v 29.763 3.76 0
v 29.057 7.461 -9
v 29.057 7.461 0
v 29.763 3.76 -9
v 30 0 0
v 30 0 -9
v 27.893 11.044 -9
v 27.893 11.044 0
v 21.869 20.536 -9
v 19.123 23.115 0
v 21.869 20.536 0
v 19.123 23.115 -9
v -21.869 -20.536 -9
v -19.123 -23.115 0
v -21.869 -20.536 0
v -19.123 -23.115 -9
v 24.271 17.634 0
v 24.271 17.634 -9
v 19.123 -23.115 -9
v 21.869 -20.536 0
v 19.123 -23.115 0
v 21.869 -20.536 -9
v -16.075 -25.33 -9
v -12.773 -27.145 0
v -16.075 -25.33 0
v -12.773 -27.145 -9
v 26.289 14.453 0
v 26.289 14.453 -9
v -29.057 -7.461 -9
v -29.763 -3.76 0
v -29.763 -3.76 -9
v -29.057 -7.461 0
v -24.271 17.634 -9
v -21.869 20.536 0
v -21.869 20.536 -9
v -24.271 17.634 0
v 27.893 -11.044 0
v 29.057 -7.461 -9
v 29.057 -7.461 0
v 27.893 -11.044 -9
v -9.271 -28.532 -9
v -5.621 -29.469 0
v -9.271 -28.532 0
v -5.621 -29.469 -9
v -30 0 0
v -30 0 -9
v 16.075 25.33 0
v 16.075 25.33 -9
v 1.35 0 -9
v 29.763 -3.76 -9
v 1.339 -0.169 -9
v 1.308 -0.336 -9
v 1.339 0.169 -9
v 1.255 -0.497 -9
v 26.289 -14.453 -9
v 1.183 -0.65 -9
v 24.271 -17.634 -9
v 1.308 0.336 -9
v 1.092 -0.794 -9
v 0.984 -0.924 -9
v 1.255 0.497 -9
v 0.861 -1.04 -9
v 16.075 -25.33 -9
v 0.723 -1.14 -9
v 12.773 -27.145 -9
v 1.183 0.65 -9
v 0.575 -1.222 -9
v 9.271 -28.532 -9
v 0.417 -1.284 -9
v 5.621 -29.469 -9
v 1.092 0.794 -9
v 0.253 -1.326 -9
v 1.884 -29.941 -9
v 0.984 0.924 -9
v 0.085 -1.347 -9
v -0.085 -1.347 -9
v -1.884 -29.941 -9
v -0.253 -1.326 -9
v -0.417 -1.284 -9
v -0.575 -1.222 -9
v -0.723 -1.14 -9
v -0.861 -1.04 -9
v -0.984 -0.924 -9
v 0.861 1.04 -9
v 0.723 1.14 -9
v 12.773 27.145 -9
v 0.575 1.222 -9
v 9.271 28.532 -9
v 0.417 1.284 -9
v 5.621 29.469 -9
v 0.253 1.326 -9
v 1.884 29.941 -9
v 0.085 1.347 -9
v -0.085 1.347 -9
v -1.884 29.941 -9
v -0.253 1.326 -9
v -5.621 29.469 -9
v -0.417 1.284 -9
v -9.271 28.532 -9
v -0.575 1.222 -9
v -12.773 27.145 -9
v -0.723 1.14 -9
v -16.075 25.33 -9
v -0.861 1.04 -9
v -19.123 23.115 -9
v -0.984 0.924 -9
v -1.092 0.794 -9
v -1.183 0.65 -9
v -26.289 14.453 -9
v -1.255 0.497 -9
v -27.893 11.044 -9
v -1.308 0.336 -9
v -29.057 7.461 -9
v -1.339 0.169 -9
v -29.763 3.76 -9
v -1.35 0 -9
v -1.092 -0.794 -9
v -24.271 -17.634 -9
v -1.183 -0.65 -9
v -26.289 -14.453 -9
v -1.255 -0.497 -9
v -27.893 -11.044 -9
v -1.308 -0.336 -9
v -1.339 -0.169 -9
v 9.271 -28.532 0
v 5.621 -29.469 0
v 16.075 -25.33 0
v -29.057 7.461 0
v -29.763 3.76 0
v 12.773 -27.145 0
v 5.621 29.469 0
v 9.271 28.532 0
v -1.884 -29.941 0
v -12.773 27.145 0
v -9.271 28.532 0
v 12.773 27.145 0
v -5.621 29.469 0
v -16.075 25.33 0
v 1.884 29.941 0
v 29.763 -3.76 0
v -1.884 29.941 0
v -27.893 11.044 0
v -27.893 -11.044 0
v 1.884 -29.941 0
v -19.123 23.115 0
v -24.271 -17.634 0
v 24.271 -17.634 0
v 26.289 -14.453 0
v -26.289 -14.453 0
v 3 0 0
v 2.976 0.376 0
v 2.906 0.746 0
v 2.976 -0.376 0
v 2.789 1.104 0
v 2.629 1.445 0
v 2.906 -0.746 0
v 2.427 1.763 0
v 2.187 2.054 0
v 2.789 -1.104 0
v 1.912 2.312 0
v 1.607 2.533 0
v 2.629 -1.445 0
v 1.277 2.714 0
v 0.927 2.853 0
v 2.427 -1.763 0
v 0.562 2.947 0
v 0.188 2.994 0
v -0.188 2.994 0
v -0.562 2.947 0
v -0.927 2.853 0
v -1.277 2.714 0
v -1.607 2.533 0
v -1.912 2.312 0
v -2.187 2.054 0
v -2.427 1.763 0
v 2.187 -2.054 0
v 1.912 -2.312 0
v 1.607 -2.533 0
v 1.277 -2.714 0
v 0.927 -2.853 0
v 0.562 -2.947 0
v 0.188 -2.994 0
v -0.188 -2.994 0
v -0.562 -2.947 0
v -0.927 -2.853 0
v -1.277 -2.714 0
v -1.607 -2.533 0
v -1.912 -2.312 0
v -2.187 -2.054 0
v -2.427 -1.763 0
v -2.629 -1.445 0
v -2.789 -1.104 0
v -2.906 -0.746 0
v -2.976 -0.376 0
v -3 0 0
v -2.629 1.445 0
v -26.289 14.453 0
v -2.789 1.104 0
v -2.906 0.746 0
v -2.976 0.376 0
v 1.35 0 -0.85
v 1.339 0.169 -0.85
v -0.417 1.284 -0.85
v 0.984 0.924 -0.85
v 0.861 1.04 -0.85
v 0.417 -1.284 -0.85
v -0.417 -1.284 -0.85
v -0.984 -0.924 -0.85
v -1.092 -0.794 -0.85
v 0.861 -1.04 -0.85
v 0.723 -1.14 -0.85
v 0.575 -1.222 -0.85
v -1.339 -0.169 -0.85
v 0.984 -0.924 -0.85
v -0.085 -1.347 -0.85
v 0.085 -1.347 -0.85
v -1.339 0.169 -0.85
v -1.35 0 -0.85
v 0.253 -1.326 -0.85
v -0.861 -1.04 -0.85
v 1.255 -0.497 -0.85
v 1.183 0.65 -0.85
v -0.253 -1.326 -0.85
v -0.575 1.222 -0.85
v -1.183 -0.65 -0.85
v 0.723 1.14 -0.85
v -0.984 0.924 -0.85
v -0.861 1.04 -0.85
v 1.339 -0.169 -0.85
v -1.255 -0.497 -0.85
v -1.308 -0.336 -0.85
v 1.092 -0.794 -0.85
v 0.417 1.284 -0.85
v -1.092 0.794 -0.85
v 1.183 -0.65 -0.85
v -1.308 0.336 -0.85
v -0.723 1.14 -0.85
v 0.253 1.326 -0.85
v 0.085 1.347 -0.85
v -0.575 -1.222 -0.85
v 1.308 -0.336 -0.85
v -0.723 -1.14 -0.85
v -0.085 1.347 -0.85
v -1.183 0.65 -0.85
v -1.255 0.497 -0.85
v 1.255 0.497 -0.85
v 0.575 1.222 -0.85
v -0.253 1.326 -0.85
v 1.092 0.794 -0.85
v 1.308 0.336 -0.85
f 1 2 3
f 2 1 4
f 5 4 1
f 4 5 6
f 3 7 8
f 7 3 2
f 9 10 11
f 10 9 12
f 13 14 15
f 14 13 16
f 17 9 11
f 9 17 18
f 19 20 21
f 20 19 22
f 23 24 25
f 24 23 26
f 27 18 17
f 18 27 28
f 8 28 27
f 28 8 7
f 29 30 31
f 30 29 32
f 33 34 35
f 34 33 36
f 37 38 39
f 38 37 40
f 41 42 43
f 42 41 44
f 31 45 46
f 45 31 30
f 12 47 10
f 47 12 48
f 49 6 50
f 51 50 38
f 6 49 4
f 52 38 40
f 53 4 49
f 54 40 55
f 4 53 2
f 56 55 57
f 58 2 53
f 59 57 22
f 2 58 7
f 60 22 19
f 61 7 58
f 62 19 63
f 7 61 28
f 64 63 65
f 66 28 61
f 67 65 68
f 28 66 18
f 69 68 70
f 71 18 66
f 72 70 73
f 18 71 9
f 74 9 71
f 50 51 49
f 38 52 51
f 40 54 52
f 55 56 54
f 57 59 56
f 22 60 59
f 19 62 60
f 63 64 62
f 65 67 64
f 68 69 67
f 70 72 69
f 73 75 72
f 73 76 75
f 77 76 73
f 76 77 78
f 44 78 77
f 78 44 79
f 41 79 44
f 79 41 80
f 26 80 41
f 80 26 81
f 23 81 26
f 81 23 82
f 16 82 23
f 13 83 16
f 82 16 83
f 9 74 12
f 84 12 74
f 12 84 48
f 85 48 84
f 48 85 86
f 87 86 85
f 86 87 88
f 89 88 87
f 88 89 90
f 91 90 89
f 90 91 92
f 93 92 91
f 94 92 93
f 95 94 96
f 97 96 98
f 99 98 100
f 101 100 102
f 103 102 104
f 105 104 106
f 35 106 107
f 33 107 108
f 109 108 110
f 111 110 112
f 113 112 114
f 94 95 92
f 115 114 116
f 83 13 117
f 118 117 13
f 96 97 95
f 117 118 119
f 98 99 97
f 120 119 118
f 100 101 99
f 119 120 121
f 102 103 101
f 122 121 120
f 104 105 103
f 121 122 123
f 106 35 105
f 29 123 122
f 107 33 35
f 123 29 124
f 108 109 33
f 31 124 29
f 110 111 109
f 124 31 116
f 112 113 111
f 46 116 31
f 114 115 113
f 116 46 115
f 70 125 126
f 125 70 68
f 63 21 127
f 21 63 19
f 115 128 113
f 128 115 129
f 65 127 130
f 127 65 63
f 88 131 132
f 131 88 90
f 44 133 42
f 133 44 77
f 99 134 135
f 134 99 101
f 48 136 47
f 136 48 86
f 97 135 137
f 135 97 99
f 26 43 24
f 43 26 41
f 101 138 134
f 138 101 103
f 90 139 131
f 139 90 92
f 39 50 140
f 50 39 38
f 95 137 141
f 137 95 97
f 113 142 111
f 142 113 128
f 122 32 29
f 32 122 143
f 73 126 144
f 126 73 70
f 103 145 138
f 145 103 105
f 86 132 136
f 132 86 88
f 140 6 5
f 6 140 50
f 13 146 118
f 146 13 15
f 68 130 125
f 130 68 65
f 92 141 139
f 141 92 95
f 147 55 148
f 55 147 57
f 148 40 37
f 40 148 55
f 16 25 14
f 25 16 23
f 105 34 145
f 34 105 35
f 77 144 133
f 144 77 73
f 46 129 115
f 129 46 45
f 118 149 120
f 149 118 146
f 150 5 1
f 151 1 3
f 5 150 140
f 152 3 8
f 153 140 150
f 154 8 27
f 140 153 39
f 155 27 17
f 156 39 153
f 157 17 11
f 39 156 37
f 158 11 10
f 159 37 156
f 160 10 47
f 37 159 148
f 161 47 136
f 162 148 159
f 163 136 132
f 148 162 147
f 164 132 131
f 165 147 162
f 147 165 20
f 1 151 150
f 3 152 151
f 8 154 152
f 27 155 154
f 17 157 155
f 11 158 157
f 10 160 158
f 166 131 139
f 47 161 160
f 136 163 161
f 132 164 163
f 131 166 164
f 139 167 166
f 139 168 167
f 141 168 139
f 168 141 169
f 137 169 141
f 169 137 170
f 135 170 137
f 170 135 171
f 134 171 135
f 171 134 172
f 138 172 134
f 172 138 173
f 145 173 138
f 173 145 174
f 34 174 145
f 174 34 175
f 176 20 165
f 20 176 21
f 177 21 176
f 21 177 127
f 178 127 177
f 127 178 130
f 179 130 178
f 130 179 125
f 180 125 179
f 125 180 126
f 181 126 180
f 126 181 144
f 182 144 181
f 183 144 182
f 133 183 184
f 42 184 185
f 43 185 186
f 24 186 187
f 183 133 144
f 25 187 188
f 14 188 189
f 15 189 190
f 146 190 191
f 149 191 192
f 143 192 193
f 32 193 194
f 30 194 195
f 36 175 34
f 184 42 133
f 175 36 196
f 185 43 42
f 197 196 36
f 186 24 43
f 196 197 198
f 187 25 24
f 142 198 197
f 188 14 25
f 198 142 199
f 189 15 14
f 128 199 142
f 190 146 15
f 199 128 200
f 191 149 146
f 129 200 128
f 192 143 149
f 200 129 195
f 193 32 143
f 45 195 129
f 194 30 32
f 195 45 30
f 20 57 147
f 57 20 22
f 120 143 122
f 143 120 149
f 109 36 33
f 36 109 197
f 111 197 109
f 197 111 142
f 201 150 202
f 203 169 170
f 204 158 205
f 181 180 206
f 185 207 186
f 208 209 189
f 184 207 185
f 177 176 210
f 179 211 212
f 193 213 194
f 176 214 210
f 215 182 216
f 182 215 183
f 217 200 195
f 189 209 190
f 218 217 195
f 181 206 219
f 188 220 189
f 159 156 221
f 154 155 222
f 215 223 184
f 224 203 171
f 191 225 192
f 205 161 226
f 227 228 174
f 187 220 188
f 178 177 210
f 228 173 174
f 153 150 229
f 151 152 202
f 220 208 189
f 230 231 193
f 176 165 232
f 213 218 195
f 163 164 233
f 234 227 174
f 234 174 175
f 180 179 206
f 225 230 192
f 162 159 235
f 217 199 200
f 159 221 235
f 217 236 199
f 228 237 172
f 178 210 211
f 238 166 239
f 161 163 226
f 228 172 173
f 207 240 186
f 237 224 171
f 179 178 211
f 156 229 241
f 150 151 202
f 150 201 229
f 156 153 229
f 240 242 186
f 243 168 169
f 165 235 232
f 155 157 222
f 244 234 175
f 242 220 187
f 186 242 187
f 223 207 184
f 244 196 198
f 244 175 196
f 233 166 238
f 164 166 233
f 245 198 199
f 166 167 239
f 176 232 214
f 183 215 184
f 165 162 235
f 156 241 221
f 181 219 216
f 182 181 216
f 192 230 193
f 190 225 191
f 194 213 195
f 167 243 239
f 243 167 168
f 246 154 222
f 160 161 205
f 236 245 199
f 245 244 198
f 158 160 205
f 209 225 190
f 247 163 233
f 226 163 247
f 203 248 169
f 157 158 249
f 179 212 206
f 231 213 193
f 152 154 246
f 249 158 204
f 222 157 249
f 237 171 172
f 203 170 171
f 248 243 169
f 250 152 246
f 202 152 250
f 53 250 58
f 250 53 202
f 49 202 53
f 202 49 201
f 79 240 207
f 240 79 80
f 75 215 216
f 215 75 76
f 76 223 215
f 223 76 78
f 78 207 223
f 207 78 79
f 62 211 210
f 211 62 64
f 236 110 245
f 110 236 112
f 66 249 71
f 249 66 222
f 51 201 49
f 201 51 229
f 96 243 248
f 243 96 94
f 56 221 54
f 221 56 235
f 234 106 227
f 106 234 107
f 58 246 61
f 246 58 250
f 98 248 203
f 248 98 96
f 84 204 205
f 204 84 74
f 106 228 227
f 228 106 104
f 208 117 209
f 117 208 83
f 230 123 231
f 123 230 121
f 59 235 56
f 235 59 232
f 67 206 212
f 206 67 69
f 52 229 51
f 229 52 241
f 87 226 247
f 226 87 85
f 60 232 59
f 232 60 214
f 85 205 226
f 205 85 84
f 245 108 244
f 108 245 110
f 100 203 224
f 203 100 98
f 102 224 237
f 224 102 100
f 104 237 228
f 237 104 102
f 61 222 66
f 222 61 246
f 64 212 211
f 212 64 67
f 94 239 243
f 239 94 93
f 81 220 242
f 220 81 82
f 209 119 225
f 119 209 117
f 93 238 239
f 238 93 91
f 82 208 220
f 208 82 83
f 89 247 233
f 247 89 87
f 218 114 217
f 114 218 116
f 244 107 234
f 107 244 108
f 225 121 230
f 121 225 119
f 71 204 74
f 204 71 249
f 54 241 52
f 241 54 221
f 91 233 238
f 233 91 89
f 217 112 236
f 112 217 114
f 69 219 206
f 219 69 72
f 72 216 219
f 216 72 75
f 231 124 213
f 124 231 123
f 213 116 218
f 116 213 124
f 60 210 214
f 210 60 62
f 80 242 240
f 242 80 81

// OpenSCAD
$fn = 50;


difference() {
	union() {
		translate(v = [0, 0, -9.0000000000]) {
			cylinder(h = 9, r = 30.0000000000);
		}
		translate(v = [0, 0, -9.0000000000]) {
			cylinder(h = 9, r = 2.8750000000);
		}
	}
	union() {
		translate(v = [0, 0, 0]) {
			rotate(a = [0, 0, 0]) {
				difference() {
					union() {
						translate(v = [0, 0, -9.0000000000]) {
							cylinder(h = 9, r = 1.0000000000);
						}
						translate(v = [0, 0, -0.8500000000]) {
							cylinder(h = 0.8500000000, r1 = 1.3500000000, r2 = 3.0000000000);
						}
						translate(v = [0, 0, -9.0000000000]) {
							cylinder(h = 9, r = 1.3500000000);
						}
						translate(v = [0, 0, -9.0000000000]) {
							cylinder(h = 9, r = 1.0000000000);
						}
					}
					union();
				}
			}
		}
	}
}
